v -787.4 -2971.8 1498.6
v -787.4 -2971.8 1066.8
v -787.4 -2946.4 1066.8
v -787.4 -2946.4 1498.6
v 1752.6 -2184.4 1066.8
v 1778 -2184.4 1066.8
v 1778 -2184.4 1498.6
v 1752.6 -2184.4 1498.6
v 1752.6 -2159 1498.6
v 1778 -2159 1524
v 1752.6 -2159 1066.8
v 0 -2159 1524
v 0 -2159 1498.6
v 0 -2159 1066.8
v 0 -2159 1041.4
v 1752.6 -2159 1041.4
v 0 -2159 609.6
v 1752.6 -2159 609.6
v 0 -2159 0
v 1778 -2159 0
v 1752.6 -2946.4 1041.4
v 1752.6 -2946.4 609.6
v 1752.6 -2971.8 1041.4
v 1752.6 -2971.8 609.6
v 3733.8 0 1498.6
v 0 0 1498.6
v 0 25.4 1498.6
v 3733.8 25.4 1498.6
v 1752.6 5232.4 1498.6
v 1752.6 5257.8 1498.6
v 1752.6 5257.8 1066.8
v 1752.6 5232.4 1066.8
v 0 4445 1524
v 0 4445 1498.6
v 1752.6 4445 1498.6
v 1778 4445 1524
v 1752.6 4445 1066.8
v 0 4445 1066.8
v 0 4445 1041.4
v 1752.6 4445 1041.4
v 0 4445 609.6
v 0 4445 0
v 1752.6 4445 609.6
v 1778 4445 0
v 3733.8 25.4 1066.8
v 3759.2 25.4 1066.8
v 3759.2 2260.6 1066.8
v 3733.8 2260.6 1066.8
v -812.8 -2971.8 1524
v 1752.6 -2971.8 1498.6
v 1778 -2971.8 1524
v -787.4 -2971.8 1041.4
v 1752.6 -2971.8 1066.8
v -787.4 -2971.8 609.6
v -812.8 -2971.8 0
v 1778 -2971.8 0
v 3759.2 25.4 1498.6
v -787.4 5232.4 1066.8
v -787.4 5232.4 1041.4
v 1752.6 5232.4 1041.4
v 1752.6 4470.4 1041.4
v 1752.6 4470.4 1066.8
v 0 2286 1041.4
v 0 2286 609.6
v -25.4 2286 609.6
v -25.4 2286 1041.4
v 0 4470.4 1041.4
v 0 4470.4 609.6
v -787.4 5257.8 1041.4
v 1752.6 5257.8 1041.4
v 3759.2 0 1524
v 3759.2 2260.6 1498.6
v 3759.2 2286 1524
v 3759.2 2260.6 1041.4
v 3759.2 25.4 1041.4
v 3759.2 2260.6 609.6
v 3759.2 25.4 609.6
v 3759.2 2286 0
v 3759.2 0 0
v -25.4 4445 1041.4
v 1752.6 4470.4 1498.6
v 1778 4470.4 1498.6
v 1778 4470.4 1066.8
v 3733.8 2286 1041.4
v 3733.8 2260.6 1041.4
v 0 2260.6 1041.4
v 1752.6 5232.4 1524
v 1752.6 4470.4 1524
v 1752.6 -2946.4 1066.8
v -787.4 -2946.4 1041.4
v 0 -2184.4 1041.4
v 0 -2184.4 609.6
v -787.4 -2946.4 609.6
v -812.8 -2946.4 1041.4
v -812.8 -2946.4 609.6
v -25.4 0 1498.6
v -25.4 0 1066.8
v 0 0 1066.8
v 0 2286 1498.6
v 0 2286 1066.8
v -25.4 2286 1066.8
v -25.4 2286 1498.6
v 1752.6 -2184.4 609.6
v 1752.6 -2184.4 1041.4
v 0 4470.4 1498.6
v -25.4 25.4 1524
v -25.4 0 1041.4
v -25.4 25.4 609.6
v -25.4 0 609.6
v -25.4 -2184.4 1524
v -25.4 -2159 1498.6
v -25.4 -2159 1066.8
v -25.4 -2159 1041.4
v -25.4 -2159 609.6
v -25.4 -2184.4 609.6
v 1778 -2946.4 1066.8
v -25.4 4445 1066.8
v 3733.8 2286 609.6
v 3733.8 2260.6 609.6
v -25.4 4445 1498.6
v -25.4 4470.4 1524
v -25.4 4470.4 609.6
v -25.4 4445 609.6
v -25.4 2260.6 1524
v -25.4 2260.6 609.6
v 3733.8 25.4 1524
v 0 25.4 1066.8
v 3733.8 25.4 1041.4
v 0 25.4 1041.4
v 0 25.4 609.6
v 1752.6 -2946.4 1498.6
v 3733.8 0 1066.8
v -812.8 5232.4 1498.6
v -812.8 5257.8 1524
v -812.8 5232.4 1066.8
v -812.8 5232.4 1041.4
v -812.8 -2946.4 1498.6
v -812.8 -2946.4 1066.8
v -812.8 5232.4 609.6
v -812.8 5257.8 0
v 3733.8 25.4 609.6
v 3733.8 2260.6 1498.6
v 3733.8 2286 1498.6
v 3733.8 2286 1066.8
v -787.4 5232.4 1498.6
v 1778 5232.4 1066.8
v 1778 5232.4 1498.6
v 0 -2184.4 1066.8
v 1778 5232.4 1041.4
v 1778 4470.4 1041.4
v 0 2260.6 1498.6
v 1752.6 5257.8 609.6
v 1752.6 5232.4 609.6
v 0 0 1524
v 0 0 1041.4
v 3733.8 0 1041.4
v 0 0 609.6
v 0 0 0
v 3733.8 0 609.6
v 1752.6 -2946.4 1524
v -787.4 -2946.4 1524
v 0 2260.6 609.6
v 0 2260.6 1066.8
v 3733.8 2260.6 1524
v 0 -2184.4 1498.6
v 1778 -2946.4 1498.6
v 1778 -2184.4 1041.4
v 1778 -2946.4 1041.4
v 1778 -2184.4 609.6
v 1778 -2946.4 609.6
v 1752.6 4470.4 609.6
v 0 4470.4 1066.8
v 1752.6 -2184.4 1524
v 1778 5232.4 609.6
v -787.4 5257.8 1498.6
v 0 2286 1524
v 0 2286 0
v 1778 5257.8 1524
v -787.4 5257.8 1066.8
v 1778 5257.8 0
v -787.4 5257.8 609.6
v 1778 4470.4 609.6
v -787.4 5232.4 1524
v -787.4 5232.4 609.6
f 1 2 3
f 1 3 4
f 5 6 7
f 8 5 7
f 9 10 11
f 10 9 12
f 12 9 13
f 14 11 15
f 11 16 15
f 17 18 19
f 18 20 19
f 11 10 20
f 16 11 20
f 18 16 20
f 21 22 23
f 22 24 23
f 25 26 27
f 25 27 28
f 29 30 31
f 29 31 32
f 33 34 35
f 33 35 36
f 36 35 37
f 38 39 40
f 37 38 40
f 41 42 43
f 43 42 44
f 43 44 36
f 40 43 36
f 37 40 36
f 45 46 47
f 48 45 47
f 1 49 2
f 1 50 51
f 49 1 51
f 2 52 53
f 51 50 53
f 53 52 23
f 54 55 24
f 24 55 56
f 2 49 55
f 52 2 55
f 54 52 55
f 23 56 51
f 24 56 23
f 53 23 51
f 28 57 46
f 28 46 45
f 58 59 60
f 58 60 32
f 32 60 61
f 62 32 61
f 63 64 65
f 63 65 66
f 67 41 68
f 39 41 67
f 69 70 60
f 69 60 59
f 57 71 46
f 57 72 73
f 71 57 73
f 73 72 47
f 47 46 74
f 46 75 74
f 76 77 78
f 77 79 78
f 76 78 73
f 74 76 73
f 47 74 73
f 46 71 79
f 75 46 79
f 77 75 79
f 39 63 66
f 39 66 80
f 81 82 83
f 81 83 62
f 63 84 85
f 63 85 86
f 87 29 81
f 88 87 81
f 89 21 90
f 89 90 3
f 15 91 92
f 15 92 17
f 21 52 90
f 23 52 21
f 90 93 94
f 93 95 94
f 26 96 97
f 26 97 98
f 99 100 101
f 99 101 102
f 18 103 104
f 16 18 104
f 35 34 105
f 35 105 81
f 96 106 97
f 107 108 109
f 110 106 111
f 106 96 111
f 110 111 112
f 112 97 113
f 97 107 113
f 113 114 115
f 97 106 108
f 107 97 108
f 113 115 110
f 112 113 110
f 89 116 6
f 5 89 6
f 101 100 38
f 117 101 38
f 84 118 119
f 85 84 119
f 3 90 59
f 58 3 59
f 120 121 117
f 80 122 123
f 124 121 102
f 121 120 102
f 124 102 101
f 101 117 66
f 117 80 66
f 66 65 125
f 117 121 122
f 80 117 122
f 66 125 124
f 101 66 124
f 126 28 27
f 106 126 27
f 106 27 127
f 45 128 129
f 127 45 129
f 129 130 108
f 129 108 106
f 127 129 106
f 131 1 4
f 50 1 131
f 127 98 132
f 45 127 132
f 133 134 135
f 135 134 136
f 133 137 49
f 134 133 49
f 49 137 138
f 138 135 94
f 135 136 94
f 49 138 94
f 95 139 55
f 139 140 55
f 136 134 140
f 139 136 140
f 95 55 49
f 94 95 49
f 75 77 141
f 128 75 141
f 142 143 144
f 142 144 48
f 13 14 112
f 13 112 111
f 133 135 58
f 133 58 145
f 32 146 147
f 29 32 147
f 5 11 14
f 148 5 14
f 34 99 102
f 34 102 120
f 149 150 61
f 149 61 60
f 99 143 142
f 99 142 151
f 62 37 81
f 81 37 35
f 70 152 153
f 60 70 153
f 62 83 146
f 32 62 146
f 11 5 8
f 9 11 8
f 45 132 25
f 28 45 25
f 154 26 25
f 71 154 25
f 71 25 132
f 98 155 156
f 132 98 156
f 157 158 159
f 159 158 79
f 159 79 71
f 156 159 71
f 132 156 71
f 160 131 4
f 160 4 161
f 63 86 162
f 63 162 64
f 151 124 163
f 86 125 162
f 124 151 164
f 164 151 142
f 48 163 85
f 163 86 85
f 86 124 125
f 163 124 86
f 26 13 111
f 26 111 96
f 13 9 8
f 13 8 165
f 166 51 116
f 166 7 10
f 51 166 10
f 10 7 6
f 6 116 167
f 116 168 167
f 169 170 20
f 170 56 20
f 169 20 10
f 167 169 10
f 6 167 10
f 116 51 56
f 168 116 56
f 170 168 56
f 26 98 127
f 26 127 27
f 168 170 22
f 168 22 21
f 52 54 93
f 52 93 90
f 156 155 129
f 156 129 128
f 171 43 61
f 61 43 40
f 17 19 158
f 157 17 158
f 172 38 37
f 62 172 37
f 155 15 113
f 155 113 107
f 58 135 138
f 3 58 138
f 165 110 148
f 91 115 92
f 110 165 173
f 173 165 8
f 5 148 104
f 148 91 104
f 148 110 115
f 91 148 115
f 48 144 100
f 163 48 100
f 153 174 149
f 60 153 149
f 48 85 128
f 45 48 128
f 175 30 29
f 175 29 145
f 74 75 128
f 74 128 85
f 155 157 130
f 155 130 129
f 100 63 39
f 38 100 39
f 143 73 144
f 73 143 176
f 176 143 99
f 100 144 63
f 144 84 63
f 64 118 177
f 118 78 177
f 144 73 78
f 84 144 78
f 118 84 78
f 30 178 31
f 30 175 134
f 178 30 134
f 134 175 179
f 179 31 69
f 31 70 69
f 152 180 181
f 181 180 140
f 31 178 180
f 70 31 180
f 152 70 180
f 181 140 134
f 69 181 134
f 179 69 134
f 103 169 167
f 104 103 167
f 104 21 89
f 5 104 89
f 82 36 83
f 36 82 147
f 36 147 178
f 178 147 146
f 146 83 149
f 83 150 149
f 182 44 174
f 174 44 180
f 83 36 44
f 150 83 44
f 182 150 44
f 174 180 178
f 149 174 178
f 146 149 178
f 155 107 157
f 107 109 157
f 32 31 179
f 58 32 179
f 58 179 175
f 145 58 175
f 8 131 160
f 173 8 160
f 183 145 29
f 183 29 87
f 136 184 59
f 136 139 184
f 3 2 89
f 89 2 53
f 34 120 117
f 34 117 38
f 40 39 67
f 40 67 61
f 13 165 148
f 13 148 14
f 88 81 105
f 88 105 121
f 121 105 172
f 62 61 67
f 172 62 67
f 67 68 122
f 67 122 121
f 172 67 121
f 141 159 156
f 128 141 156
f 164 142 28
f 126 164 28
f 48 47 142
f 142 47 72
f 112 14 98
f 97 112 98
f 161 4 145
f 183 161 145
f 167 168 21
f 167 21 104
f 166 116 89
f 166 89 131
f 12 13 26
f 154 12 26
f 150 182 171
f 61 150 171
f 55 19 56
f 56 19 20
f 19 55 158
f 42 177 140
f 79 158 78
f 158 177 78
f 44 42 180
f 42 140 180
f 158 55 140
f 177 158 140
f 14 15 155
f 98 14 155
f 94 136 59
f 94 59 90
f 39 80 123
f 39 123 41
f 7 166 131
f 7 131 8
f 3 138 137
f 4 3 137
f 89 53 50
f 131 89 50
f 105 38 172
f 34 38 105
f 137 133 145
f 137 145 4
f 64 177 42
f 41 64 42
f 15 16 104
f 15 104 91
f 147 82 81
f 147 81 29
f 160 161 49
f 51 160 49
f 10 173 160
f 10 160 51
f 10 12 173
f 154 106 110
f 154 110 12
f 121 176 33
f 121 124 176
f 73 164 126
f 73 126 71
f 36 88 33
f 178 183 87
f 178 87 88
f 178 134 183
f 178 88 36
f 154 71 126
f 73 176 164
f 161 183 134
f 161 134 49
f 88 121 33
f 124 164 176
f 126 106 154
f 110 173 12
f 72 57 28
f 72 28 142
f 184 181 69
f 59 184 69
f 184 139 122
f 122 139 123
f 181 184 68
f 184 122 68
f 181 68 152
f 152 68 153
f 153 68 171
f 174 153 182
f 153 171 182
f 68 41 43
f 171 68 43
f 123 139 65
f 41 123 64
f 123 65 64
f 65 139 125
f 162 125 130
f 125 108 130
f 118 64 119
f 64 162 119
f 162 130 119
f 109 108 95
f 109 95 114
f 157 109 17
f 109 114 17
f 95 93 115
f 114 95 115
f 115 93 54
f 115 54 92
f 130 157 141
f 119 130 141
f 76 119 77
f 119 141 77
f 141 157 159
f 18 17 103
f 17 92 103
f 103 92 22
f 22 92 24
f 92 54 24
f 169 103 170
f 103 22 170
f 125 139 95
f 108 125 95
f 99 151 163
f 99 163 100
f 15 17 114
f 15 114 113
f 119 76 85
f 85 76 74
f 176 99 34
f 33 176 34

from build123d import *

# Parameters (mm, degrees)
F1_DEPTH  = 609.6
F3_DEPTH  = 914.4
F4_W      = 8178.8
F4_H      = 431.8
F5_DEPTH  = 50.8
F6_W      = 2540
F6_H      = 431.8
F7_DEPTH  = 76.2
F8_W      = 3733.8
F8_H      = 431.8
F9_DEPTH  = 76.2
F10_W     = 2235.2
F10_H     = 431.8
F11_DEPTH = 76.2
F12_W     = 2540
F12_H     = 431.8
F13_DEPTH = 76.2
F14_W     = 762
F14_H     = 431.8
F15_DEPTH = 76.2
F16_W     = 2159
F16_H     = 431.8
F17_DEPTH = 76.2
F18_W     = 1752.6
F18_H     = 431.8
F19_DEPTH = 76.2
F20_W     = 1752.6
F20_H     = 431.8
F21_DEPTH = 50.8
F22_W     = 762
F22_H     = 431.8
F23_DEPTH = 25.4
F24_W     = 2159
F24_H     = 431.8
F25_DEPTH = 25.4
F26_W     = 3733.8
F26_H     = 431.8
F27_DEPTH = 25.4


with BuildPart() as f1:
    # F0 (on Top) → F1 (new body)
    with BuildSketch(Plane.XY):
        Polygon((0, -2159), (0, 0), (3759.2, 0), (3759.2, 2286), (0, 2286), (0, 4445), (1778, 4445), (1778, 5257.8), (-812.8, 5257.8), (-812.8, -2971.8), (1778, -2971.8), (1778, -2159), align=None)
    extrude(amount=F1_DEPTH)

    # F2 (on face) → F3 (join)
    with BuildSketch(Plane.XY.offset(609.6)):
        Polygon((-812.8, -2971.8), (1778, -2971.8), (1778, -2159), (0, -2159), (0, 0), (3759.2, 0), (3759.2, 2286), (0, 2286), (0, 4445), (1778, 4445), (1778, 5257.8), (-812.8, 5257.8), align=None)
        Polygon((1752.6, -2946.4), (-787.4, -2946.4), (-787.4, 5232.4), (1752.6, 5232.4), (1752.6, 4470.4), (-25.4, 4470.4), (-25.4, 2260.6), (3733.8, 2260.6), (3733.8, 25.4), (-25.4, 25.4), (-25.4, -2184.4), (1752.6, -2184.4), align=None, mode=Mode.SUBTRACT)
    extrude(amount=F3_DEPTH)

    # F4 (on face) → F5 (cut)
    with BuildSketch(Plane(origin=(-812.8, 0, 0), x_dir=(0, -1, 0), z_dir=(-1, 0, 0))):
        with Locations((-1143, 1282.7)):
            Rectangle(F4_W, F4_H)
        with Locations((-1143, 825.5)):
            Rectangle(F4_W, F4_H)
    extrude(amount=-F5_DEPTH, mode=Mode.SUBTRACT)

    # F6 (on face) → F7 (cut)
    with BuildSketch(Plane.XZ.offset(2971.8)):
        with Locations((482.6, 1282.7)):
            Rectangle(F6_W, F6_H)
        with Locations((482.6, 825.5)):
            Rectangle(F6_W, F6_H)
    extrude(amount=-F7_DEPTH, mode=Mode.SUBTRACT)

    # F8 (on face) → F9 (cut)
    with BuildSketch(Plane(origin=(0, 2286, 0), x_dir=(-1, 0, 0), z_dir=(0, 1, 0))):
        with Locations((-1866.9, 1282.7)):
            Rectangle(F8_W, F8_H)
        with Locations((-1866.9, 825.5)):
            Rectangle(F8_W, F8_H)
    extrude(amount=-F9_DEPTH, mode=Mode.SUBTRACT)

    # F10 (on face) → F11 (cut)
    with BuildSketch(Plane.YZ.offset(3759.2)):
        with Locations((1143, 1282.7)):
            Rectangle(F10_W, F10_H)
        with Locations((1143, 825.5)):
            Rectangle(F10_W, F10_H)
    extrude(amount=-F11_DEPTH, mode=Mode.SUBTRACT)

    # F12 (on face) → F13 (cut)
    with BuildSketch(Plane(origin=(0, 5257.8, 0), x_dir=(-1, 0, 0), z_dir=(0, 1, 0))):
        with Locations((-482.6, 1282.7)):
            Rectangle(F12_W, F12_H)
        with Locations((-482.6, 825.5)):
            Rectangle(F12_W, F12_H)
    extrude(amount=-F13_DEPTH, mode=Mode.SUBTRACT)

    # F14 (on face) → F15 (cut)
    with BuildSketch(Plane.YZ.offset(1778)):
        with Locations((4851.4, 1282.7)):
            Rectangle(F14_W, F14_H)
        with Locations((4851.4, 825.5)):
            Rectangle(F14_W, F14_H)
    extrude(amount=-F15_DEPTH, mode=Mode.SUBTRACT)

    # F16 (on face) → F17 (cut)
    with BuildSketch(Plane.YZ):
        with Locations((3365.5, 1282.7)):
            Rectangle(F16_W, F16_H)
        with Locations((3365.5, 825.5)):
            Rectangle(F16_W, F16_H)
    extrude(amount=-F17_DEPTH, mode=Mode.SUBTRACT)

    # F18 (on face) → F19 (cut)
    with BuildSketch(Plane.XZ.offset(-4445)):
        with Locations((876.3, 1282.7)):
            Rectangle(F18_W, F18_H)
        with Locations((876.3, 825.5)):
            Rectangle(F18_W, F18_H)
    extrude(amount=-F19_DEPTH, mode=Mode.SUBTRACT)

    # F20 (on face) → F21 (cut)
    with BuildSketch(Plane(origin=(0, -2159, 0), x_dir=(-1, 0, 0), z_dir=(0, 1, 0))):
        with Locations((-876.3, 1282.7)):
            Rectangle(F20_W, F20_H)
        with Locations((-876.3, 825.5)):
            Rectangle(F20_W, F20_H)
    extrude(amount=-F21_DEPTH, mode=Mode.SUBTRACT)

    # F22 (on face) → F23 (cut)
    with BuildSketch(Plane.YZ.offset(1778)):
        with Locations((-2565.4, 1282.7)):
            Rectangle(F22_W, F22_H)
        with Locations((-2565.4, 825.5)):
            Rectangle(F22_W, F22_H)
    extrude(amount=-F23_DEPTH, mode=Mode.SUBTRACT)

    # F24 (on face) → F25 (cut)
    with BuildSketch(Plane.YZ):
        with Locations((-1079.5, 1282.7)):
            Rectangle(F24_W, F24_H)
        with Locations((-1079.5, 825.5)):
            Rectangle(F24_W, F24_H)
    extrude(amount=-F25_DEPTH, mode=Mode.SUBTRACT)

    # F26 (on face) → F27 (cut)
    with BuildSketch(Plane.XZ):
        with Locations((1866.9, 1282.7)):
            Rectangle(F26_W, F26_H)
        with Locations((1866.9, 825.5)):
            Rectangle(F26_W, F26_H)
    extrude(amount=-F27_DEPTH, mode=Mode.SUBTRACT)


solid = f1.part
